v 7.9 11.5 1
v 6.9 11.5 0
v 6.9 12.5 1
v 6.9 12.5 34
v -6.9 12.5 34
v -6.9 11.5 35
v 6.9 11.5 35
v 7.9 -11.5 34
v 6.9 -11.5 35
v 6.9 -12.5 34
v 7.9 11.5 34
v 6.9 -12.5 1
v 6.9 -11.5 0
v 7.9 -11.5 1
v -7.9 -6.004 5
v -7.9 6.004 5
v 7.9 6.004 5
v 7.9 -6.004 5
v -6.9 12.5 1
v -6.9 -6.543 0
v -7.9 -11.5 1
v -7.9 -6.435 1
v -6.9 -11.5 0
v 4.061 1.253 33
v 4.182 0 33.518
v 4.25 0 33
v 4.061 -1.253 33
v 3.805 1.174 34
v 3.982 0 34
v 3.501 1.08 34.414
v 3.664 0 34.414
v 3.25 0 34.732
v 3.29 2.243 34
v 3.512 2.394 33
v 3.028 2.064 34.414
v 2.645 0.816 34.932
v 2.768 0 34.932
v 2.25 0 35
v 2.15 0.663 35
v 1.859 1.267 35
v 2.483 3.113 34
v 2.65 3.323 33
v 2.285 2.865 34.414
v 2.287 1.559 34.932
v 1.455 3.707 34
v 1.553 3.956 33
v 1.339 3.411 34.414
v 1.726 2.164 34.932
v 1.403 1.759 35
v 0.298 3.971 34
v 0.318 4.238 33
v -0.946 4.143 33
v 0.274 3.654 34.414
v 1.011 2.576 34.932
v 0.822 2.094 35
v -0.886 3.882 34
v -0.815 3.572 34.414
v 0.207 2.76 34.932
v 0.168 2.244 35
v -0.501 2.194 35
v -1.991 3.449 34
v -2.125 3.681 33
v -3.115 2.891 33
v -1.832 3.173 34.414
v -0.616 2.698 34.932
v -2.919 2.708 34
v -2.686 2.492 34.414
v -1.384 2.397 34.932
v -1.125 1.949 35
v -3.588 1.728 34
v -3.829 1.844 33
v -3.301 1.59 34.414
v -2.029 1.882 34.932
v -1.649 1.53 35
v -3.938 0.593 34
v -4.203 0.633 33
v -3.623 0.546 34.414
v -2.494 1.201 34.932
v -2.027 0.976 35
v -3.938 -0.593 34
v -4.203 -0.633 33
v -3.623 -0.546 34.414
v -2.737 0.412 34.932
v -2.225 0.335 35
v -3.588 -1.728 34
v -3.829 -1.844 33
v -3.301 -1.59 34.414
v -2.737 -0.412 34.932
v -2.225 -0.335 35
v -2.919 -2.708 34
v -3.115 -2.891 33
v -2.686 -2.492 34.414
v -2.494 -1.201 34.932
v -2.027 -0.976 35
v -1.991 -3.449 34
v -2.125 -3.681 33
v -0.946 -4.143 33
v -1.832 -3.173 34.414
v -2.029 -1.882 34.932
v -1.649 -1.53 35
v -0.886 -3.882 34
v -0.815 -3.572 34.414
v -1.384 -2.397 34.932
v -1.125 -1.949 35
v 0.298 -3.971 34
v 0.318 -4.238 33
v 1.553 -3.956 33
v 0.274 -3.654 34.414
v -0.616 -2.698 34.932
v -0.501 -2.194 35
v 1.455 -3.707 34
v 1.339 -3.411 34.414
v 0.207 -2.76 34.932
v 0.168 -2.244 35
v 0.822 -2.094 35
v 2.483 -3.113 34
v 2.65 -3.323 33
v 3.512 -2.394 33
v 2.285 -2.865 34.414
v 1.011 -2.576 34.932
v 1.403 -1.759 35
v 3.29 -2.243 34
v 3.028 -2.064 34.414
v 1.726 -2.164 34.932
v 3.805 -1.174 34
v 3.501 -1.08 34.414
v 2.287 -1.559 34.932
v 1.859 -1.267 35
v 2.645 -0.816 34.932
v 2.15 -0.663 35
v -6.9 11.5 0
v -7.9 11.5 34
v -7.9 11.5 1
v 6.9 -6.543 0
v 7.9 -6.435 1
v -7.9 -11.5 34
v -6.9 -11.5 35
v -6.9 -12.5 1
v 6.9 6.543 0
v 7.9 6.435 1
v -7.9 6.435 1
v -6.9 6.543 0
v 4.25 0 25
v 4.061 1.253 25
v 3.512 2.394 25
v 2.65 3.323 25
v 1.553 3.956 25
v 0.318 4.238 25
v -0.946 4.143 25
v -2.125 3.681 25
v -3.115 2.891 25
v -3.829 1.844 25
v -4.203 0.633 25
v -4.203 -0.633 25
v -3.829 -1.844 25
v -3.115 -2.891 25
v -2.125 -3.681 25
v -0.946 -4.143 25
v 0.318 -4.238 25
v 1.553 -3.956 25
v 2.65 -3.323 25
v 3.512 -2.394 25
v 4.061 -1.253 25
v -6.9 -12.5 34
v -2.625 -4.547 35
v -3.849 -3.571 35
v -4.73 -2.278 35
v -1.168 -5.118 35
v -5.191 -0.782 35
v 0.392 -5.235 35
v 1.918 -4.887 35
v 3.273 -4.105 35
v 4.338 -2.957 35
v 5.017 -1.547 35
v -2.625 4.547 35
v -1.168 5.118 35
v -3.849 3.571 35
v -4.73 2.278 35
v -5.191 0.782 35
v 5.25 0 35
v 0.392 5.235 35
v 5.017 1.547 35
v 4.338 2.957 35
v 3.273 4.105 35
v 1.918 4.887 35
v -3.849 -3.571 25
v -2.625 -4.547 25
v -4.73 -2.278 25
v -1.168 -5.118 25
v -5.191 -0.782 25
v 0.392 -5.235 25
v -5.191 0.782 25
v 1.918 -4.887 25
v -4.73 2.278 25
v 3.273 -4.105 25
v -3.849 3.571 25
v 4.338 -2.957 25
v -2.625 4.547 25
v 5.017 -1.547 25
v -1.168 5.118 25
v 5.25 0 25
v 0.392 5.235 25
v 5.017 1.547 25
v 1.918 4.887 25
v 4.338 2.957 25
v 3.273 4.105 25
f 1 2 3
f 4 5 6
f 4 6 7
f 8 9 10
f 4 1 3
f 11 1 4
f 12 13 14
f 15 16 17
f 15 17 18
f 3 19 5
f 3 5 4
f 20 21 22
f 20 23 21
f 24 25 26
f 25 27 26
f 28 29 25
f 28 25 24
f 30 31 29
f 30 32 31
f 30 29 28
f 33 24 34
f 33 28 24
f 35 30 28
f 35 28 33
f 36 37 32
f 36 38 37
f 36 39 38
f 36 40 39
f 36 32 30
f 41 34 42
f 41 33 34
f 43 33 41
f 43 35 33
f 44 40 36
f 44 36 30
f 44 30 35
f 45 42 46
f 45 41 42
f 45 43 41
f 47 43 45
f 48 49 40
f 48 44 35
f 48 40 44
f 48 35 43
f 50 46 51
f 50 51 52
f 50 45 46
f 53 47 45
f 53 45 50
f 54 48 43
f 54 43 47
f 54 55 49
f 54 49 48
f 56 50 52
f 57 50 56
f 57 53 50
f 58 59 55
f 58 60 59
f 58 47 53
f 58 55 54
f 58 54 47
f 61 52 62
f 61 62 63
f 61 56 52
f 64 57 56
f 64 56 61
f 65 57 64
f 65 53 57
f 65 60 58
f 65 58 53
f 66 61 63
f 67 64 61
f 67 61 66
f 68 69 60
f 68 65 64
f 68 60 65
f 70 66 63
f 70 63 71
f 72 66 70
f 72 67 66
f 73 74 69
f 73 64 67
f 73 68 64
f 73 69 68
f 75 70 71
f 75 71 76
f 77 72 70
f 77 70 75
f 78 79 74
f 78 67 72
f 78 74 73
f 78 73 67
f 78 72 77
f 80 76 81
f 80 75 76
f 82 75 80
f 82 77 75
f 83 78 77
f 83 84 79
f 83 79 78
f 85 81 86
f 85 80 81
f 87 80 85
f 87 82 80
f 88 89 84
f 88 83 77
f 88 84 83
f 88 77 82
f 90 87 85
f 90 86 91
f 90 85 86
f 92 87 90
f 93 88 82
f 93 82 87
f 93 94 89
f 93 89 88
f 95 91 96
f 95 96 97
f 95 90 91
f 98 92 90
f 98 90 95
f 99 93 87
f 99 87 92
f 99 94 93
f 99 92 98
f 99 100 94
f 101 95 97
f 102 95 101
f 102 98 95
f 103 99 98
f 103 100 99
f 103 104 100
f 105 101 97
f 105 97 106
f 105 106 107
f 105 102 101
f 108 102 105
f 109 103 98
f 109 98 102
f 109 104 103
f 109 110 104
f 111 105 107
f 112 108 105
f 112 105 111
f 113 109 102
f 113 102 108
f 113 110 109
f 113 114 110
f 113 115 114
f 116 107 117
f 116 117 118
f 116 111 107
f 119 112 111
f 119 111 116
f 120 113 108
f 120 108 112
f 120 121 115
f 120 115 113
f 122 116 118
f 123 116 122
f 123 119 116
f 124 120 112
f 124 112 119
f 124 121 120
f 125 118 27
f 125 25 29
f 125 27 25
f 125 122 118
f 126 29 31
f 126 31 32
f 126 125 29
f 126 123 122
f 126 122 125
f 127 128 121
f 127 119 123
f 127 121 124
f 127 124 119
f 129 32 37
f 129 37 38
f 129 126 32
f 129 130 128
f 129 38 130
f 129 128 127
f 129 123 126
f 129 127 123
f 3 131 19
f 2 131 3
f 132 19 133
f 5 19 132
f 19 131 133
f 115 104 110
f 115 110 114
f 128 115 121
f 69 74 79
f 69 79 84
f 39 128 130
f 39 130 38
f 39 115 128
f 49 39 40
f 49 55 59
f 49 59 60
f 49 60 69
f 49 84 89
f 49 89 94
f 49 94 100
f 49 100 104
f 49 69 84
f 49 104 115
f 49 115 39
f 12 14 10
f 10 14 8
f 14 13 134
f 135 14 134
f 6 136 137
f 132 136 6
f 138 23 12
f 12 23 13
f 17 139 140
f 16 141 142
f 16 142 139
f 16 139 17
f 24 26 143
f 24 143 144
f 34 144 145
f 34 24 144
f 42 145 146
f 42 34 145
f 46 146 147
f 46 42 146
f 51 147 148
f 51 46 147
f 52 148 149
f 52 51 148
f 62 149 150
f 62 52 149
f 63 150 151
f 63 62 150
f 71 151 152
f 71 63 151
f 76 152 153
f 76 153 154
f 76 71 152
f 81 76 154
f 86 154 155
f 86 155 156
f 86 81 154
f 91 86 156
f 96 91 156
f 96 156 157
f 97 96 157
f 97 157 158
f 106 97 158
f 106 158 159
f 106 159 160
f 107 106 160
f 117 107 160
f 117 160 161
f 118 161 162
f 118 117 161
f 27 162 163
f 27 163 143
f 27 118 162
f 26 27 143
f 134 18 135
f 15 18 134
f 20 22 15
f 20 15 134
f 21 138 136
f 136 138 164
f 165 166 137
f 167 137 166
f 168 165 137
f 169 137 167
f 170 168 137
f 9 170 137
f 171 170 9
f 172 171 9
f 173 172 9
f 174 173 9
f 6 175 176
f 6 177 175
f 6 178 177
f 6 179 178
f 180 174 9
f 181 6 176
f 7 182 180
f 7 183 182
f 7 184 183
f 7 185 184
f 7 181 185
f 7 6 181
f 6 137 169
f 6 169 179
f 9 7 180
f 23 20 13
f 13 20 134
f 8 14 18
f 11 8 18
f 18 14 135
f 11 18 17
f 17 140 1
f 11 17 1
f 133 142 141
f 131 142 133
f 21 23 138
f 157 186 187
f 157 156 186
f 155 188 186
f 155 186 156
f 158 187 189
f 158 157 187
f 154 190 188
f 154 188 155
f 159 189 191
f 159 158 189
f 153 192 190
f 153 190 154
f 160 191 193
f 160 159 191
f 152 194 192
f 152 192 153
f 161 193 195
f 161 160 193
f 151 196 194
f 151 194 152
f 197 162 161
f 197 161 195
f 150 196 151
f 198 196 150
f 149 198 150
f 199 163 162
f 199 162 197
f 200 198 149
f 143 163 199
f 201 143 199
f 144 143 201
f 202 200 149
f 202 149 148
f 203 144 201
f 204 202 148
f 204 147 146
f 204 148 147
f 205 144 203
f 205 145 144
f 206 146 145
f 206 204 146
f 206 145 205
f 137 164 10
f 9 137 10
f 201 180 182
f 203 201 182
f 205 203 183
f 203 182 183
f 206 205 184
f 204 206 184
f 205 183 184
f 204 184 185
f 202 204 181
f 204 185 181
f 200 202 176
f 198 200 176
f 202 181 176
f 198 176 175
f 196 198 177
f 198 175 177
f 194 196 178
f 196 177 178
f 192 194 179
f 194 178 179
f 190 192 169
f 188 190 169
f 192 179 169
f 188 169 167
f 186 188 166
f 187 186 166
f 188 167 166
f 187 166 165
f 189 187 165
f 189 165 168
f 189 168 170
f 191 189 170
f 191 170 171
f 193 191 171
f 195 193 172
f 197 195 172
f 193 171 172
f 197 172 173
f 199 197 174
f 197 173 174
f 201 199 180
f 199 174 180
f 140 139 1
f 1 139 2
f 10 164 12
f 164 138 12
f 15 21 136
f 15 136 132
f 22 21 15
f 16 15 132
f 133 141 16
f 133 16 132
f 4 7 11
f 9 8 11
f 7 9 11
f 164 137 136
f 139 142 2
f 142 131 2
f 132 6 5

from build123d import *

# Parameters (mm, degrees)
SKETCH_3_W               = 15.8
SKETCH_3_H               = 25
EXTRUDE_2_DEPTH          = 35
SKETCH_4_R               = 5.25
SKETCH_4_R_2             = 4.25
CUT_EXTRUDE_1_DEPTH      = 10
CUT_EXTRUDE_3_DEPTH      = 38.995526052
CUT_EXTRUDE_3_DEPTH_BACK = 38.995526052
FILLET_1_R               = 2
CHAMFER_1_SIZE           = 1


with BuildPart() as part:
    # 스케치3 → 보스-돌출2 (new body)
    with BuildSketch(Plane.XY):
        Rectangle(SKETCH_3_W, SKETCH_3_H)
    extrude(amount=EXTRUDE_2_DEPTH)

    # 스케치4 → 컷-돌출1 (cut)
    with BuildSketch(Plane.XY.offset(35)):
        Circle(SKETCH_4_R)
        Circle(SKETCH_4_R_2, mode=Mode.SUBTRACT)
    extrude(amount=-CUT_EXTRUDE_1_DEPTH, mode=Mode.SUBTRACT)

    # 스케치5 → 컷-돌출3 (cut, two sides: drawn at the far end of the back side and taken through both)
    with BuildSketch(Plane(origin=(0, 0, 0), x_dir=(0, 0, -1), z_dir=(1, 0, 0)).offset(-CUT_EXTRUDE_3_DEPTH_BACK)):
        Polygon((2.109074987, 6.770011202), (-5, 6.004306325), (-5, -6.004306325), (2.109074987, -6.770011202), align=None)
    extrude(amount=CUT_EXTRUDE_3_DEPTH + CUT_EXTRUDE_3_DEPTH_BACK, mode=Mode.SUBTRACT)

    # 필렛1
    fillet_1_edges = [part.edges().sort_by_distance(p)[0] for p in [
        (-4.25, 0, 35),
    ]]
    fillet(fillet_1_edges, radius=FILLET_1_R)

    # 모따기1
    chamfer_1_edges = [part.edges().sort_by_distance(p)[0] for p in [
        (-7.9, 0, 35),
        (0, -12.5, 35),
        (7.9, 9.521423383, 0),
        (-7.9, -9.521423383, 0),
        (7.9, 0, 35),
        (0, -12.5, 0),
        (-7.9, 9.521423383, 0),
        (0, 12.5, 0),
        (7.9, -9.521423383, 0),
        (0, 12.5, 35),
        (7.9, -12.5, 17.5),
        (-7.9, -12.5, 17.5),
        (-7.9, 12.5, 17.5),
        (7.9, 12.5, 17.5),
    ]]
    chamfer(chamfer_1_edges, length=CHAMFER_1_SIZE)


solid = part.part
